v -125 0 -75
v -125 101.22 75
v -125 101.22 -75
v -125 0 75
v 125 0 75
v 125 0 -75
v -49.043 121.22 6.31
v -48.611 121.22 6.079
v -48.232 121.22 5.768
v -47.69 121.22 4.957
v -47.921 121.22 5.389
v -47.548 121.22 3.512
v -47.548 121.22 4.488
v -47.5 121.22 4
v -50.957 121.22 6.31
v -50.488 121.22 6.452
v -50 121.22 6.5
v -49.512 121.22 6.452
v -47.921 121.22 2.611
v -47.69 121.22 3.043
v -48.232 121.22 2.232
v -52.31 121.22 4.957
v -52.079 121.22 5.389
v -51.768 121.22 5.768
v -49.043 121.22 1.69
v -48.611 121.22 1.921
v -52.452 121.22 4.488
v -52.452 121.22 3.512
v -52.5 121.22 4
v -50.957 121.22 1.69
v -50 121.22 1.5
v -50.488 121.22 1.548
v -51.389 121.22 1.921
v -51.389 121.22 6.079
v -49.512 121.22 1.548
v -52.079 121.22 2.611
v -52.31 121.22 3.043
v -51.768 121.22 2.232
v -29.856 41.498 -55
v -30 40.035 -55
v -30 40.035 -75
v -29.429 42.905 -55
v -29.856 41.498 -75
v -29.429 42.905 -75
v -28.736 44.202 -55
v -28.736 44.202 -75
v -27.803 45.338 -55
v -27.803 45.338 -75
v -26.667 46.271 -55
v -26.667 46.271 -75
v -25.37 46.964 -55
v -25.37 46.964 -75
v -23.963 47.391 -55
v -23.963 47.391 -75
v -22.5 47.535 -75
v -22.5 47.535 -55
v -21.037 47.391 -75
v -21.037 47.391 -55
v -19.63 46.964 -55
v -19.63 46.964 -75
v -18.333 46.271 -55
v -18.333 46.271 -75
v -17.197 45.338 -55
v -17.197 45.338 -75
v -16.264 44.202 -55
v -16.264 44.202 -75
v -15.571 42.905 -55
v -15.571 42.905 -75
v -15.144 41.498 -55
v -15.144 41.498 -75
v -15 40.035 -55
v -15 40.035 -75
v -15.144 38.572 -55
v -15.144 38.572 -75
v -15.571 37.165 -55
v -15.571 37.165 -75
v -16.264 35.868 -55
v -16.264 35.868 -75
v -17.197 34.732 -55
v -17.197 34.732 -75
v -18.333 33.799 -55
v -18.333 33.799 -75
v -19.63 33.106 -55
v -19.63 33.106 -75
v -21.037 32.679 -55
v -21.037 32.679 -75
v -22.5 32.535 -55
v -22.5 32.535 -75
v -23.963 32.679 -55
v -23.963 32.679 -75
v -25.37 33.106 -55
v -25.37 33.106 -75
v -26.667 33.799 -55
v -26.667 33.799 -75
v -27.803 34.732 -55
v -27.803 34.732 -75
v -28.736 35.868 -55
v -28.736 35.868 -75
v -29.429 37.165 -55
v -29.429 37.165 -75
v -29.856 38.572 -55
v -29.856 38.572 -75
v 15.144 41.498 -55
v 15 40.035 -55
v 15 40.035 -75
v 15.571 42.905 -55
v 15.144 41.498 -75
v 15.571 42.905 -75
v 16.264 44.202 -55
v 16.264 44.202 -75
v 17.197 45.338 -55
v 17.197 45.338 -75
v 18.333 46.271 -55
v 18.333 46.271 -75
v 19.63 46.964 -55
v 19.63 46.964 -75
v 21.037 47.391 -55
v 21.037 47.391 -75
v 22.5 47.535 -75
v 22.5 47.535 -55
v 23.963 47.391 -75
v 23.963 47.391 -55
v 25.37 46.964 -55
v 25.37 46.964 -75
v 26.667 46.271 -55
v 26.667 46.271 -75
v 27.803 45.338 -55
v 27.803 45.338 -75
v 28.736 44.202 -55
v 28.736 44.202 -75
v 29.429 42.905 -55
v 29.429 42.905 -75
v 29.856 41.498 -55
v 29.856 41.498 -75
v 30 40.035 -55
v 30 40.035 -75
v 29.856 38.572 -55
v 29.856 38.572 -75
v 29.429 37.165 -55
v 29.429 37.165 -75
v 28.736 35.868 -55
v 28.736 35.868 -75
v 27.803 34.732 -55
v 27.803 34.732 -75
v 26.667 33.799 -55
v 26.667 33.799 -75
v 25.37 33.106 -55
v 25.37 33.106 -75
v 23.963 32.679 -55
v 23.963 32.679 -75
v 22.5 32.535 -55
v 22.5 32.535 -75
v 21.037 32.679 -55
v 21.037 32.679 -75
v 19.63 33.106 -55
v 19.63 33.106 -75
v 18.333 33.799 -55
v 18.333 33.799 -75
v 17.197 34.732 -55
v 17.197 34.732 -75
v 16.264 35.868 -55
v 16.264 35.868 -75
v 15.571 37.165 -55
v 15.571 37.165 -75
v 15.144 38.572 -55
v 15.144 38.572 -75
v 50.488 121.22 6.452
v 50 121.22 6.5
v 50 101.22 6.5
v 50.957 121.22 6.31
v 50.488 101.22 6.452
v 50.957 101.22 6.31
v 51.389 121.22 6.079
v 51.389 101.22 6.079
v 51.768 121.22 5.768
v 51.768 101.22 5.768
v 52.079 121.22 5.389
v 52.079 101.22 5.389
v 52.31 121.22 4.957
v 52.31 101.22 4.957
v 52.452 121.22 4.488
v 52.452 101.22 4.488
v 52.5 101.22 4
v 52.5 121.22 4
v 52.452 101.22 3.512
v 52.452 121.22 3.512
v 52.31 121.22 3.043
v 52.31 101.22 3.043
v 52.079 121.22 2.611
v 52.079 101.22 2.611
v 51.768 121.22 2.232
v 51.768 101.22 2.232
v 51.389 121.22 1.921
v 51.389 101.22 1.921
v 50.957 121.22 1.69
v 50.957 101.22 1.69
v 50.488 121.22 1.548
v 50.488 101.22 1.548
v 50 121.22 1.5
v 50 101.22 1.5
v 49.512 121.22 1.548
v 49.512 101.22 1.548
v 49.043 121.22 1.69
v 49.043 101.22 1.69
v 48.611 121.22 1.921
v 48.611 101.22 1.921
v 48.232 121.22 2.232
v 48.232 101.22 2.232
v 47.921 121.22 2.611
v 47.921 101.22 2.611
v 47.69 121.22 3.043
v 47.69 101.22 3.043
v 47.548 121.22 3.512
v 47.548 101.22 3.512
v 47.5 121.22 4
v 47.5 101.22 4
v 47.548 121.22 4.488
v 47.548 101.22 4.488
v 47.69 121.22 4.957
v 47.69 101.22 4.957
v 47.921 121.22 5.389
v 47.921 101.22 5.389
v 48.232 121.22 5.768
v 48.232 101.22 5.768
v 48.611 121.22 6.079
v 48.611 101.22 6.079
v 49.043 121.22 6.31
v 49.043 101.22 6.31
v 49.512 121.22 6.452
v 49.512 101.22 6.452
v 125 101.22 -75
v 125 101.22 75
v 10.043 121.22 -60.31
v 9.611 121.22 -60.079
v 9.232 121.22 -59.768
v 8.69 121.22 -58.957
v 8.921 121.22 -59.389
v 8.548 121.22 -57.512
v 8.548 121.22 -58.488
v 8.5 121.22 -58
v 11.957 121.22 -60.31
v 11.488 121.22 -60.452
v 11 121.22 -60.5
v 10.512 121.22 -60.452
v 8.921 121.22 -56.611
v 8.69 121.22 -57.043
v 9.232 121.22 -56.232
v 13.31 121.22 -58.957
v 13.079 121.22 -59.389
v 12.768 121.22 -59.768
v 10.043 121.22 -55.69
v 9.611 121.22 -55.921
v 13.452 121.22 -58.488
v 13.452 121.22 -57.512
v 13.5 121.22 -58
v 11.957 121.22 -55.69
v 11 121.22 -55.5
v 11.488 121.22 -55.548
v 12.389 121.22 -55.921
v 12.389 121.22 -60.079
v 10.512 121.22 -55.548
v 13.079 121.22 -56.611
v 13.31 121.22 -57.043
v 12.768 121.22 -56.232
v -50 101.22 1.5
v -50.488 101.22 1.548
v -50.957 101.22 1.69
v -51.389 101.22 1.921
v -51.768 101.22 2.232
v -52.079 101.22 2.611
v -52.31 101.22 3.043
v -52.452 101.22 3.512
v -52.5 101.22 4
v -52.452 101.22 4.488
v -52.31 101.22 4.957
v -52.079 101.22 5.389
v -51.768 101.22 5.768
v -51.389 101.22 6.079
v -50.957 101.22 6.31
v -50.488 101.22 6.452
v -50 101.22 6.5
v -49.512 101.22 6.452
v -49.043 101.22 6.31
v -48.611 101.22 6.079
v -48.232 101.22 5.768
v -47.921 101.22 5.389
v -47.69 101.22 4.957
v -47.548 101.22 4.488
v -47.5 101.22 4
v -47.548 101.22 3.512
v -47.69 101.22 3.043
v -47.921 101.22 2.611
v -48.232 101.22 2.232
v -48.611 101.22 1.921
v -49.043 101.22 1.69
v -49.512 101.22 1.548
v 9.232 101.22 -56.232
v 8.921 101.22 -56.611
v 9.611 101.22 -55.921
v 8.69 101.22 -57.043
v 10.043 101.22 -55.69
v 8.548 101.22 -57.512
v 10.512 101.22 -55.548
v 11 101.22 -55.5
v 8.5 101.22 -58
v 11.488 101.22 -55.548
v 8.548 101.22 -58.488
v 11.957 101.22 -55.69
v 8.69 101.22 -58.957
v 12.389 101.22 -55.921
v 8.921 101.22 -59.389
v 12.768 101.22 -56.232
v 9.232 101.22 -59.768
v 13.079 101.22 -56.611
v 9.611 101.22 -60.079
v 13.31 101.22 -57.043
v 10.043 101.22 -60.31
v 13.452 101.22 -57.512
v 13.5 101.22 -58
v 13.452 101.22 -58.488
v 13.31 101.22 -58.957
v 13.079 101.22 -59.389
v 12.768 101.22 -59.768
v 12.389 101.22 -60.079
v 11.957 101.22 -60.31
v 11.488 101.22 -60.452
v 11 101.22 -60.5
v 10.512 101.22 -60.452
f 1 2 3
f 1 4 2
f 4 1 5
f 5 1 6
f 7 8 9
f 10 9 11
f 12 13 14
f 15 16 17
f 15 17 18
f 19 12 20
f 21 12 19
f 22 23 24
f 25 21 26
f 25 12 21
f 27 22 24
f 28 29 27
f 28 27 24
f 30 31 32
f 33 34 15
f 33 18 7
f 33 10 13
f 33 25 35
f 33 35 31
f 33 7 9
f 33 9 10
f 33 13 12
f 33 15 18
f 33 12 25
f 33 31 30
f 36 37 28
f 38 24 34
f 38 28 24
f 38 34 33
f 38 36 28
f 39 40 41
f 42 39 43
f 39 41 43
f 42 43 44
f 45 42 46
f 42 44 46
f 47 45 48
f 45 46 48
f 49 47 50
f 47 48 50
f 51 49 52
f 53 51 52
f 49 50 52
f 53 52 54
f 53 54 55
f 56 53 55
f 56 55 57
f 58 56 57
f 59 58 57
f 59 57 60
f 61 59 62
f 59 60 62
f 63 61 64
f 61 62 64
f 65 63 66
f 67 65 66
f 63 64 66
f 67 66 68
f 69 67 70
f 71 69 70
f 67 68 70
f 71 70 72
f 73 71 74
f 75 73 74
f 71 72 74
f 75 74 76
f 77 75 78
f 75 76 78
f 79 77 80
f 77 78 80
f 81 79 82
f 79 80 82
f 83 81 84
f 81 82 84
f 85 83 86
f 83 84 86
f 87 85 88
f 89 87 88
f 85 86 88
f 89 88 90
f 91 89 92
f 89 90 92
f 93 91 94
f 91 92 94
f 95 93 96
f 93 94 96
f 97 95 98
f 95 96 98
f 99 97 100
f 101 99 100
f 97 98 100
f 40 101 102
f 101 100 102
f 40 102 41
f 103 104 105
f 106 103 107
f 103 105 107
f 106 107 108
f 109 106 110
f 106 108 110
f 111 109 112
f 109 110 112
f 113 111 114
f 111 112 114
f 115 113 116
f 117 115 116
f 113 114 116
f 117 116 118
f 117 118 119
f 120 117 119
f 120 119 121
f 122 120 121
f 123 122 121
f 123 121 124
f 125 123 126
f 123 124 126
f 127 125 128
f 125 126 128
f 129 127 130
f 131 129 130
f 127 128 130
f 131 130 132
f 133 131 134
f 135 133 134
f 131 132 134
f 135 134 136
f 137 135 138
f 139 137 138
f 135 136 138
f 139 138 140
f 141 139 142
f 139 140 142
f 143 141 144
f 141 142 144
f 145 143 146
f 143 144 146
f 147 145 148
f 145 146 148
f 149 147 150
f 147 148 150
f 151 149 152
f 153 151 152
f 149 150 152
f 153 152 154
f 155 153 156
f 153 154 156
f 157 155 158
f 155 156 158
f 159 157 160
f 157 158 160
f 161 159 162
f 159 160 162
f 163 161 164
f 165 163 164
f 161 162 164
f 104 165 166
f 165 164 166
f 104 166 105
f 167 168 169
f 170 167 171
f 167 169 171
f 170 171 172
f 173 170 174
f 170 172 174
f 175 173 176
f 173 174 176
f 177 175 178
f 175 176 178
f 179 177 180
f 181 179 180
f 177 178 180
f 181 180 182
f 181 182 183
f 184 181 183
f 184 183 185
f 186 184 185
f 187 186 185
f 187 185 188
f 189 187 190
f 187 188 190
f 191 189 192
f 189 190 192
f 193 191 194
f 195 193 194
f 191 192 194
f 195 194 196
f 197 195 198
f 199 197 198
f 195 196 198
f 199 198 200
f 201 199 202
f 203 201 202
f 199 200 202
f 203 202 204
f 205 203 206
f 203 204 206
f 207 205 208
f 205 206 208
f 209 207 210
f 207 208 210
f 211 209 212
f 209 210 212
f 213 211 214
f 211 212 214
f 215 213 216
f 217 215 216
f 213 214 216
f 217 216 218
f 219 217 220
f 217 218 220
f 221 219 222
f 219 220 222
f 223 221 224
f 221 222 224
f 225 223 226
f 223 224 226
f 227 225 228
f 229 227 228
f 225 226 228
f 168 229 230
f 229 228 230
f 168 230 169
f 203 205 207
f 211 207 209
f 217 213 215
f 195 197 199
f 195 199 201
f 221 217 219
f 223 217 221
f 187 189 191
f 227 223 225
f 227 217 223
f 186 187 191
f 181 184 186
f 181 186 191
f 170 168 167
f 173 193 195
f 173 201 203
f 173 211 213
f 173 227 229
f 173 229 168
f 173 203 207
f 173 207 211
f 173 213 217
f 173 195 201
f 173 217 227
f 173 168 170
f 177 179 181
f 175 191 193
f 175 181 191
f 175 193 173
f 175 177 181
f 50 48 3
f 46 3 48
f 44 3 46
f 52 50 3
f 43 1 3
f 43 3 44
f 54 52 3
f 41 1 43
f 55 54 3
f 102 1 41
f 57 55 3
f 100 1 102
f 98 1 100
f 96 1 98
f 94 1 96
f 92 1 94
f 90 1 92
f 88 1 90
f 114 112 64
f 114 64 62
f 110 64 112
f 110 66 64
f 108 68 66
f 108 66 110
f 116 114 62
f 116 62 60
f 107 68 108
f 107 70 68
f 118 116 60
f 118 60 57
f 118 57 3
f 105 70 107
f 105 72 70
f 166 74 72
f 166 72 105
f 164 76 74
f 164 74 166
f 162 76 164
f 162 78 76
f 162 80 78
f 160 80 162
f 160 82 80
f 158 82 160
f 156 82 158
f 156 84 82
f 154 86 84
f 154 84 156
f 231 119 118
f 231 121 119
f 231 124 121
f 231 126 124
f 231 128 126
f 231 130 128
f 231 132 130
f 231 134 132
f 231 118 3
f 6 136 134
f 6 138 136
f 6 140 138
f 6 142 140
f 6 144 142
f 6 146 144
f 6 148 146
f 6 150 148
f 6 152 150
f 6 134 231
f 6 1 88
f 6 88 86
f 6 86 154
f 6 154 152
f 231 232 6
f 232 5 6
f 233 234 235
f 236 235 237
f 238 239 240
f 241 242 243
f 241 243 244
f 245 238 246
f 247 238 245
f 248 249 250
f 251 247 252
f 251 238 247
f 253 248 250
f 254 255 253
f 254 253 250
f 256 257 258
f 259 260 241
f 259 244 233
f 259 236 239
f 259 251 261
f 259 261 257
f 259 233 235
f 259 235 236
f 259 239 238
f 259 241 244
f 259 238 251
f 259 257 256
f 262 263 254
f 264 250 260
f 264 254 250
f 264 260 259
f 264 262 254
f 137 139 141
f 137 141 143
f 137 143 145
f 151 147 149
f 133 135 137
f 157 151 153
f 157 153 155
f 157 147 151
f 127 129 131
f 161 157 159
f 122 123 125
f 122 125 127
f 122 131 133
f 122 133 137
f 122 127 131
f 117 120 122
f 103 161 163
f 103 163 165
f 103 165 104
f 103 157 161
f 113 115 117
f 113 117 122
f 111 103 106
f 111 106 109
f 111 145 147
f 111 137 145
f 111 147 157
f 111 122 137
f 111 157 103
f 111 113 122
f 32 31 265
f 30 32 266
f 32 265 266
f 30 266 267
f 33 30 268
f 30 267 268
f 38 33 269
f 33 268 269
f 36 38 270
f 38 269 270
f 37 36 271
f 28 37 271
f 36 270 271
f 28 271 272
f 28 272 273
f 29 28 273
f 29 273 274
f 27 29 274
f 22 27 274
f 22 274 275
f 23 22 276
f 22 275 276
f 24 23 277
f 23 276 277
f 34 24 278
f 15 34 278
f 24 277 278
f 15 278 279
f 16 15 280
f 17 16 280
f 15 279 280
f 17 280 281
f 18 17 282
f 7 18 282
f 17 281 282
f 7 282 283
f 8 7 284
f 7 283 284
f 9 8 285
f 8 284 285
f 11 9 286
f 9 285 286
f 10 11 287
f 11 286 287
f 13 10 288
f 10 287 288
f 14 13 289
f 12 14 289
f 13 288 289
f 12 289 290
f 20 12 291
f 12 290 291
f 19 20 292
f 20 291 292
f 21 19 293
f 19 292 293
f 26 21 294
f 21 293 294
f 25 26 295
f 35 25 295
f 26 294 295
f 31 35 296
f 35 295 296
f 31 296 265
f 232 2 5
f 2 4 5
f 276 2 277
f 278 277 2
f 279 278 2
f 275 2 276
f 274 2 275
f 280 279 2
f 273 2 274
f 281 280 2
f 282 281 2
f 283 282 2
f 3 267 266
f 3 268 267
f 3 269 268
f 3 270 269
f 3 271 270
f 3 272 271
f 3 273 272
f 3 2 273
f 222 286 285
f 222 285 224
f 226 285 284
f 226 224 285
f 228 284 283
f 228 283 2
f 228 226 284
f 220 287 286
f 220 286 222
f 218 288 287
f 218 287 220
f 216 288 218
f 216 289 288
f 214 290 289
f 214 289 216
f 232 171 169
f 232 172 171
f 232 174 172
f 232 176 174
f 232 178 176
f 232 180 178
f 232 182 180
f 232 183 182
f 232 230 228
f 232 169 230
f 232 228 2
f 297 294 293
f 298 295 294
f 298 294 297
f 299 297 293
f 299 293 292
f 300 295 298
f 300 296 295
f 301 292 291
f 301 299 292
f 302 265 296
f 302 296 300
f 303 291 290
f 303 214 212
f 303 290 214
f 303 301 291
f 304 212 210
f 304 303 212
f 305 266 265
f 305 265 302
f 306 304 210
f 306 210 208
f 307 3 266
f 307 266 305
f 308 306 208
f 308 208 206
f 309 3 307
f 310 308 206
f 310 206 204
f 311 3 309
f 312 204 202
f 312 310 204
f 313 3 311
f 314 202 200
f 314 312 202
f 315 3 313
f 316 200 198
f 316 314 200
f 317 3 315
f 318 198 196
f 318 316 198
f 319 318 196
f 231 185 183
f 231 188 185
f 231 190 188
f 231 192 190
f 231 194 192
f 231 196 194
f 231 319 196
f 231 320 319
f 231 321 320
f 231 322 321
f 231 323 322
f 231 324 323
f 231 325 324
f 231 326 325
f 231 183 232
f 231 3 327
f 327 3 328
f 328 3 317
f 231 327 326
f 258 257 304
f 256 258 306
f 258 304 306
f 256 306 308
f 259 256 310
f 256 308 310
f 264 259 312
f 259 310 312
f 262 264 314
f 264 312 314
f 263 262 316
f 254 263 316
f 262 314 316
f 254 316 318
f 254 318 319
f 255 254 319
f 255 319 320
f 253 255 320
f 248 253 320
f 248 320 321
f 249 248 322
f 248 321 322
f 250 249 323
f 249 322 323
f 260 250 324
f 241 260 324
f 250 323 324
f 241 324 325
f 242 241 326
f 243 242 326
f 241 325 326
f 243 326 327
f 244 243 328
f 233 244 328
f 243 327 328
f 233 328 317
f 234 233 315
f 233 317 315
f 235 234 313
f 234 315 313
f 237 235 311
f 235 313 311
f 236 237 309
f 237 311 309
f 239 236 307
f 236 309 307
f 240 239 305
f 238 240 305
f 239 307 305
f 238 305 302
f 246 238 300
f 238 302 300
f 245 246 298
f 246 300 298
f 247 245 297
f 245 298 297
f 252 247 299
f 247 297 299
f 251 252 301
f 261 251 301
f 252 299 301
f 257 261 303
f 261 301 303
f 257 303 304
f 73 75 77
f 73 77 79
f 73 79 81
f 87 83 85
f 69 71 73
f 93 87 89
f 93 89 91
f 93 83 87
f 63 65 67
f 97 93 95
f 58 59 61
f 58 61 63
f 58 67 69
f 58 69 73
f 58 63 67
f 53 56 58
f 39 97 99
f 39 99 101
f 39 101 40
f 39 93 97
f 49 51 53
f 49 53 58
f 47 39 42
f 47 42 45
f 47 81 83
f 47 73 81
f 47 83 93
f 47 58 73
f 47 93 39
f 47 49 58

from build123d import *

# Parameters (mm, degrees)
SKETCH_2_W          = 250
SKETCH_2_H          = 150
EXTRUDE_1_DEPTH     = 80.07
SKETCH_6_R          = 7.5
CUT_EXTRUDE_1_DEPTH = 20
SKETCH_7_W          = 250
SKETCH_7_H          = 150
EXTRUDE_2_DEPTH     = 21.15
SKETCH_13_R         = 2.5
EXTRUDE_4_DEPTH     = 20
SKETCH_15_R         = 2.5
EXTRUDE_5_DEPTH     = 20


with BuildPart() as part:
    # 草图2 → 凸台-拉伸1 (new body)
    with BuildSketch(Plane(origin=(0, 0, 0), x_dir=(1, 0, 0), z_dir=(0, 1, 0))):
        Rectangle(SKETCH_2_W, SKETCH_2_H)
    extrude(amount=EXTRUDE_1_DEPTH)

    # 草图6 → 切除-拉伸1 (cut)
    with BuildSketch(Plane(origin=(0, 0, -75), x_dir=(-1, 0, 0), z_dir=(0, 0, -1))):
        with Locations((-22.5, 40.035)):
            Circle(SKETCH_6_R)
        with Locations((22.5, 40.035)):
            Circle(SKETCH_6_R)
    extrude(amount=-CUT_EXTRUDE_1_DEPTH, mode=Mode.SUBTRACT)

    # 草图7 → 凸台-拉伸2 (add)
    with BuildSketch(Plane(origin=(0, 80.07, 0), x_dir=(1, 0, 0), z_dir=(0, 1, 0))):
        Rectangle(SKETCH_7_W, SKETCH_7_H)
    extrude(amount=EXTRUDE_2_DEPTH)

    # 草图13 → 凸台-拉伸4 (add)
    with BuildSketch(Plane(origin=(0, 101.22, 0), x_dir=(1, 0, 0), z_dir=(0, 1, 0))):
        with Locations(Location((11, 58, 0), (0, 0, 270))):
            Circle(SKETCH_13_R)
    extrude(amount=EXTRUDE_4_DEPTH)

    # 草图15 → 凸台-拉伸5 (add)
    with BuildSketch(Plane(origin=(0, 101.22, 0), x_dir=(1, 0, 0), z_dir=(0, 1, 0))):
        with Locations(Location((50, -4, 0), (0, 0, 270))):
            Circle(SKETCH_15_R)
        with Locations(Location((-50, -4, 0), (0, 0, 90))):
            Circle(SKETCH_15_R)
    extrude(amount=EXTRUDE_5_DEPTH)


solid = part.part
